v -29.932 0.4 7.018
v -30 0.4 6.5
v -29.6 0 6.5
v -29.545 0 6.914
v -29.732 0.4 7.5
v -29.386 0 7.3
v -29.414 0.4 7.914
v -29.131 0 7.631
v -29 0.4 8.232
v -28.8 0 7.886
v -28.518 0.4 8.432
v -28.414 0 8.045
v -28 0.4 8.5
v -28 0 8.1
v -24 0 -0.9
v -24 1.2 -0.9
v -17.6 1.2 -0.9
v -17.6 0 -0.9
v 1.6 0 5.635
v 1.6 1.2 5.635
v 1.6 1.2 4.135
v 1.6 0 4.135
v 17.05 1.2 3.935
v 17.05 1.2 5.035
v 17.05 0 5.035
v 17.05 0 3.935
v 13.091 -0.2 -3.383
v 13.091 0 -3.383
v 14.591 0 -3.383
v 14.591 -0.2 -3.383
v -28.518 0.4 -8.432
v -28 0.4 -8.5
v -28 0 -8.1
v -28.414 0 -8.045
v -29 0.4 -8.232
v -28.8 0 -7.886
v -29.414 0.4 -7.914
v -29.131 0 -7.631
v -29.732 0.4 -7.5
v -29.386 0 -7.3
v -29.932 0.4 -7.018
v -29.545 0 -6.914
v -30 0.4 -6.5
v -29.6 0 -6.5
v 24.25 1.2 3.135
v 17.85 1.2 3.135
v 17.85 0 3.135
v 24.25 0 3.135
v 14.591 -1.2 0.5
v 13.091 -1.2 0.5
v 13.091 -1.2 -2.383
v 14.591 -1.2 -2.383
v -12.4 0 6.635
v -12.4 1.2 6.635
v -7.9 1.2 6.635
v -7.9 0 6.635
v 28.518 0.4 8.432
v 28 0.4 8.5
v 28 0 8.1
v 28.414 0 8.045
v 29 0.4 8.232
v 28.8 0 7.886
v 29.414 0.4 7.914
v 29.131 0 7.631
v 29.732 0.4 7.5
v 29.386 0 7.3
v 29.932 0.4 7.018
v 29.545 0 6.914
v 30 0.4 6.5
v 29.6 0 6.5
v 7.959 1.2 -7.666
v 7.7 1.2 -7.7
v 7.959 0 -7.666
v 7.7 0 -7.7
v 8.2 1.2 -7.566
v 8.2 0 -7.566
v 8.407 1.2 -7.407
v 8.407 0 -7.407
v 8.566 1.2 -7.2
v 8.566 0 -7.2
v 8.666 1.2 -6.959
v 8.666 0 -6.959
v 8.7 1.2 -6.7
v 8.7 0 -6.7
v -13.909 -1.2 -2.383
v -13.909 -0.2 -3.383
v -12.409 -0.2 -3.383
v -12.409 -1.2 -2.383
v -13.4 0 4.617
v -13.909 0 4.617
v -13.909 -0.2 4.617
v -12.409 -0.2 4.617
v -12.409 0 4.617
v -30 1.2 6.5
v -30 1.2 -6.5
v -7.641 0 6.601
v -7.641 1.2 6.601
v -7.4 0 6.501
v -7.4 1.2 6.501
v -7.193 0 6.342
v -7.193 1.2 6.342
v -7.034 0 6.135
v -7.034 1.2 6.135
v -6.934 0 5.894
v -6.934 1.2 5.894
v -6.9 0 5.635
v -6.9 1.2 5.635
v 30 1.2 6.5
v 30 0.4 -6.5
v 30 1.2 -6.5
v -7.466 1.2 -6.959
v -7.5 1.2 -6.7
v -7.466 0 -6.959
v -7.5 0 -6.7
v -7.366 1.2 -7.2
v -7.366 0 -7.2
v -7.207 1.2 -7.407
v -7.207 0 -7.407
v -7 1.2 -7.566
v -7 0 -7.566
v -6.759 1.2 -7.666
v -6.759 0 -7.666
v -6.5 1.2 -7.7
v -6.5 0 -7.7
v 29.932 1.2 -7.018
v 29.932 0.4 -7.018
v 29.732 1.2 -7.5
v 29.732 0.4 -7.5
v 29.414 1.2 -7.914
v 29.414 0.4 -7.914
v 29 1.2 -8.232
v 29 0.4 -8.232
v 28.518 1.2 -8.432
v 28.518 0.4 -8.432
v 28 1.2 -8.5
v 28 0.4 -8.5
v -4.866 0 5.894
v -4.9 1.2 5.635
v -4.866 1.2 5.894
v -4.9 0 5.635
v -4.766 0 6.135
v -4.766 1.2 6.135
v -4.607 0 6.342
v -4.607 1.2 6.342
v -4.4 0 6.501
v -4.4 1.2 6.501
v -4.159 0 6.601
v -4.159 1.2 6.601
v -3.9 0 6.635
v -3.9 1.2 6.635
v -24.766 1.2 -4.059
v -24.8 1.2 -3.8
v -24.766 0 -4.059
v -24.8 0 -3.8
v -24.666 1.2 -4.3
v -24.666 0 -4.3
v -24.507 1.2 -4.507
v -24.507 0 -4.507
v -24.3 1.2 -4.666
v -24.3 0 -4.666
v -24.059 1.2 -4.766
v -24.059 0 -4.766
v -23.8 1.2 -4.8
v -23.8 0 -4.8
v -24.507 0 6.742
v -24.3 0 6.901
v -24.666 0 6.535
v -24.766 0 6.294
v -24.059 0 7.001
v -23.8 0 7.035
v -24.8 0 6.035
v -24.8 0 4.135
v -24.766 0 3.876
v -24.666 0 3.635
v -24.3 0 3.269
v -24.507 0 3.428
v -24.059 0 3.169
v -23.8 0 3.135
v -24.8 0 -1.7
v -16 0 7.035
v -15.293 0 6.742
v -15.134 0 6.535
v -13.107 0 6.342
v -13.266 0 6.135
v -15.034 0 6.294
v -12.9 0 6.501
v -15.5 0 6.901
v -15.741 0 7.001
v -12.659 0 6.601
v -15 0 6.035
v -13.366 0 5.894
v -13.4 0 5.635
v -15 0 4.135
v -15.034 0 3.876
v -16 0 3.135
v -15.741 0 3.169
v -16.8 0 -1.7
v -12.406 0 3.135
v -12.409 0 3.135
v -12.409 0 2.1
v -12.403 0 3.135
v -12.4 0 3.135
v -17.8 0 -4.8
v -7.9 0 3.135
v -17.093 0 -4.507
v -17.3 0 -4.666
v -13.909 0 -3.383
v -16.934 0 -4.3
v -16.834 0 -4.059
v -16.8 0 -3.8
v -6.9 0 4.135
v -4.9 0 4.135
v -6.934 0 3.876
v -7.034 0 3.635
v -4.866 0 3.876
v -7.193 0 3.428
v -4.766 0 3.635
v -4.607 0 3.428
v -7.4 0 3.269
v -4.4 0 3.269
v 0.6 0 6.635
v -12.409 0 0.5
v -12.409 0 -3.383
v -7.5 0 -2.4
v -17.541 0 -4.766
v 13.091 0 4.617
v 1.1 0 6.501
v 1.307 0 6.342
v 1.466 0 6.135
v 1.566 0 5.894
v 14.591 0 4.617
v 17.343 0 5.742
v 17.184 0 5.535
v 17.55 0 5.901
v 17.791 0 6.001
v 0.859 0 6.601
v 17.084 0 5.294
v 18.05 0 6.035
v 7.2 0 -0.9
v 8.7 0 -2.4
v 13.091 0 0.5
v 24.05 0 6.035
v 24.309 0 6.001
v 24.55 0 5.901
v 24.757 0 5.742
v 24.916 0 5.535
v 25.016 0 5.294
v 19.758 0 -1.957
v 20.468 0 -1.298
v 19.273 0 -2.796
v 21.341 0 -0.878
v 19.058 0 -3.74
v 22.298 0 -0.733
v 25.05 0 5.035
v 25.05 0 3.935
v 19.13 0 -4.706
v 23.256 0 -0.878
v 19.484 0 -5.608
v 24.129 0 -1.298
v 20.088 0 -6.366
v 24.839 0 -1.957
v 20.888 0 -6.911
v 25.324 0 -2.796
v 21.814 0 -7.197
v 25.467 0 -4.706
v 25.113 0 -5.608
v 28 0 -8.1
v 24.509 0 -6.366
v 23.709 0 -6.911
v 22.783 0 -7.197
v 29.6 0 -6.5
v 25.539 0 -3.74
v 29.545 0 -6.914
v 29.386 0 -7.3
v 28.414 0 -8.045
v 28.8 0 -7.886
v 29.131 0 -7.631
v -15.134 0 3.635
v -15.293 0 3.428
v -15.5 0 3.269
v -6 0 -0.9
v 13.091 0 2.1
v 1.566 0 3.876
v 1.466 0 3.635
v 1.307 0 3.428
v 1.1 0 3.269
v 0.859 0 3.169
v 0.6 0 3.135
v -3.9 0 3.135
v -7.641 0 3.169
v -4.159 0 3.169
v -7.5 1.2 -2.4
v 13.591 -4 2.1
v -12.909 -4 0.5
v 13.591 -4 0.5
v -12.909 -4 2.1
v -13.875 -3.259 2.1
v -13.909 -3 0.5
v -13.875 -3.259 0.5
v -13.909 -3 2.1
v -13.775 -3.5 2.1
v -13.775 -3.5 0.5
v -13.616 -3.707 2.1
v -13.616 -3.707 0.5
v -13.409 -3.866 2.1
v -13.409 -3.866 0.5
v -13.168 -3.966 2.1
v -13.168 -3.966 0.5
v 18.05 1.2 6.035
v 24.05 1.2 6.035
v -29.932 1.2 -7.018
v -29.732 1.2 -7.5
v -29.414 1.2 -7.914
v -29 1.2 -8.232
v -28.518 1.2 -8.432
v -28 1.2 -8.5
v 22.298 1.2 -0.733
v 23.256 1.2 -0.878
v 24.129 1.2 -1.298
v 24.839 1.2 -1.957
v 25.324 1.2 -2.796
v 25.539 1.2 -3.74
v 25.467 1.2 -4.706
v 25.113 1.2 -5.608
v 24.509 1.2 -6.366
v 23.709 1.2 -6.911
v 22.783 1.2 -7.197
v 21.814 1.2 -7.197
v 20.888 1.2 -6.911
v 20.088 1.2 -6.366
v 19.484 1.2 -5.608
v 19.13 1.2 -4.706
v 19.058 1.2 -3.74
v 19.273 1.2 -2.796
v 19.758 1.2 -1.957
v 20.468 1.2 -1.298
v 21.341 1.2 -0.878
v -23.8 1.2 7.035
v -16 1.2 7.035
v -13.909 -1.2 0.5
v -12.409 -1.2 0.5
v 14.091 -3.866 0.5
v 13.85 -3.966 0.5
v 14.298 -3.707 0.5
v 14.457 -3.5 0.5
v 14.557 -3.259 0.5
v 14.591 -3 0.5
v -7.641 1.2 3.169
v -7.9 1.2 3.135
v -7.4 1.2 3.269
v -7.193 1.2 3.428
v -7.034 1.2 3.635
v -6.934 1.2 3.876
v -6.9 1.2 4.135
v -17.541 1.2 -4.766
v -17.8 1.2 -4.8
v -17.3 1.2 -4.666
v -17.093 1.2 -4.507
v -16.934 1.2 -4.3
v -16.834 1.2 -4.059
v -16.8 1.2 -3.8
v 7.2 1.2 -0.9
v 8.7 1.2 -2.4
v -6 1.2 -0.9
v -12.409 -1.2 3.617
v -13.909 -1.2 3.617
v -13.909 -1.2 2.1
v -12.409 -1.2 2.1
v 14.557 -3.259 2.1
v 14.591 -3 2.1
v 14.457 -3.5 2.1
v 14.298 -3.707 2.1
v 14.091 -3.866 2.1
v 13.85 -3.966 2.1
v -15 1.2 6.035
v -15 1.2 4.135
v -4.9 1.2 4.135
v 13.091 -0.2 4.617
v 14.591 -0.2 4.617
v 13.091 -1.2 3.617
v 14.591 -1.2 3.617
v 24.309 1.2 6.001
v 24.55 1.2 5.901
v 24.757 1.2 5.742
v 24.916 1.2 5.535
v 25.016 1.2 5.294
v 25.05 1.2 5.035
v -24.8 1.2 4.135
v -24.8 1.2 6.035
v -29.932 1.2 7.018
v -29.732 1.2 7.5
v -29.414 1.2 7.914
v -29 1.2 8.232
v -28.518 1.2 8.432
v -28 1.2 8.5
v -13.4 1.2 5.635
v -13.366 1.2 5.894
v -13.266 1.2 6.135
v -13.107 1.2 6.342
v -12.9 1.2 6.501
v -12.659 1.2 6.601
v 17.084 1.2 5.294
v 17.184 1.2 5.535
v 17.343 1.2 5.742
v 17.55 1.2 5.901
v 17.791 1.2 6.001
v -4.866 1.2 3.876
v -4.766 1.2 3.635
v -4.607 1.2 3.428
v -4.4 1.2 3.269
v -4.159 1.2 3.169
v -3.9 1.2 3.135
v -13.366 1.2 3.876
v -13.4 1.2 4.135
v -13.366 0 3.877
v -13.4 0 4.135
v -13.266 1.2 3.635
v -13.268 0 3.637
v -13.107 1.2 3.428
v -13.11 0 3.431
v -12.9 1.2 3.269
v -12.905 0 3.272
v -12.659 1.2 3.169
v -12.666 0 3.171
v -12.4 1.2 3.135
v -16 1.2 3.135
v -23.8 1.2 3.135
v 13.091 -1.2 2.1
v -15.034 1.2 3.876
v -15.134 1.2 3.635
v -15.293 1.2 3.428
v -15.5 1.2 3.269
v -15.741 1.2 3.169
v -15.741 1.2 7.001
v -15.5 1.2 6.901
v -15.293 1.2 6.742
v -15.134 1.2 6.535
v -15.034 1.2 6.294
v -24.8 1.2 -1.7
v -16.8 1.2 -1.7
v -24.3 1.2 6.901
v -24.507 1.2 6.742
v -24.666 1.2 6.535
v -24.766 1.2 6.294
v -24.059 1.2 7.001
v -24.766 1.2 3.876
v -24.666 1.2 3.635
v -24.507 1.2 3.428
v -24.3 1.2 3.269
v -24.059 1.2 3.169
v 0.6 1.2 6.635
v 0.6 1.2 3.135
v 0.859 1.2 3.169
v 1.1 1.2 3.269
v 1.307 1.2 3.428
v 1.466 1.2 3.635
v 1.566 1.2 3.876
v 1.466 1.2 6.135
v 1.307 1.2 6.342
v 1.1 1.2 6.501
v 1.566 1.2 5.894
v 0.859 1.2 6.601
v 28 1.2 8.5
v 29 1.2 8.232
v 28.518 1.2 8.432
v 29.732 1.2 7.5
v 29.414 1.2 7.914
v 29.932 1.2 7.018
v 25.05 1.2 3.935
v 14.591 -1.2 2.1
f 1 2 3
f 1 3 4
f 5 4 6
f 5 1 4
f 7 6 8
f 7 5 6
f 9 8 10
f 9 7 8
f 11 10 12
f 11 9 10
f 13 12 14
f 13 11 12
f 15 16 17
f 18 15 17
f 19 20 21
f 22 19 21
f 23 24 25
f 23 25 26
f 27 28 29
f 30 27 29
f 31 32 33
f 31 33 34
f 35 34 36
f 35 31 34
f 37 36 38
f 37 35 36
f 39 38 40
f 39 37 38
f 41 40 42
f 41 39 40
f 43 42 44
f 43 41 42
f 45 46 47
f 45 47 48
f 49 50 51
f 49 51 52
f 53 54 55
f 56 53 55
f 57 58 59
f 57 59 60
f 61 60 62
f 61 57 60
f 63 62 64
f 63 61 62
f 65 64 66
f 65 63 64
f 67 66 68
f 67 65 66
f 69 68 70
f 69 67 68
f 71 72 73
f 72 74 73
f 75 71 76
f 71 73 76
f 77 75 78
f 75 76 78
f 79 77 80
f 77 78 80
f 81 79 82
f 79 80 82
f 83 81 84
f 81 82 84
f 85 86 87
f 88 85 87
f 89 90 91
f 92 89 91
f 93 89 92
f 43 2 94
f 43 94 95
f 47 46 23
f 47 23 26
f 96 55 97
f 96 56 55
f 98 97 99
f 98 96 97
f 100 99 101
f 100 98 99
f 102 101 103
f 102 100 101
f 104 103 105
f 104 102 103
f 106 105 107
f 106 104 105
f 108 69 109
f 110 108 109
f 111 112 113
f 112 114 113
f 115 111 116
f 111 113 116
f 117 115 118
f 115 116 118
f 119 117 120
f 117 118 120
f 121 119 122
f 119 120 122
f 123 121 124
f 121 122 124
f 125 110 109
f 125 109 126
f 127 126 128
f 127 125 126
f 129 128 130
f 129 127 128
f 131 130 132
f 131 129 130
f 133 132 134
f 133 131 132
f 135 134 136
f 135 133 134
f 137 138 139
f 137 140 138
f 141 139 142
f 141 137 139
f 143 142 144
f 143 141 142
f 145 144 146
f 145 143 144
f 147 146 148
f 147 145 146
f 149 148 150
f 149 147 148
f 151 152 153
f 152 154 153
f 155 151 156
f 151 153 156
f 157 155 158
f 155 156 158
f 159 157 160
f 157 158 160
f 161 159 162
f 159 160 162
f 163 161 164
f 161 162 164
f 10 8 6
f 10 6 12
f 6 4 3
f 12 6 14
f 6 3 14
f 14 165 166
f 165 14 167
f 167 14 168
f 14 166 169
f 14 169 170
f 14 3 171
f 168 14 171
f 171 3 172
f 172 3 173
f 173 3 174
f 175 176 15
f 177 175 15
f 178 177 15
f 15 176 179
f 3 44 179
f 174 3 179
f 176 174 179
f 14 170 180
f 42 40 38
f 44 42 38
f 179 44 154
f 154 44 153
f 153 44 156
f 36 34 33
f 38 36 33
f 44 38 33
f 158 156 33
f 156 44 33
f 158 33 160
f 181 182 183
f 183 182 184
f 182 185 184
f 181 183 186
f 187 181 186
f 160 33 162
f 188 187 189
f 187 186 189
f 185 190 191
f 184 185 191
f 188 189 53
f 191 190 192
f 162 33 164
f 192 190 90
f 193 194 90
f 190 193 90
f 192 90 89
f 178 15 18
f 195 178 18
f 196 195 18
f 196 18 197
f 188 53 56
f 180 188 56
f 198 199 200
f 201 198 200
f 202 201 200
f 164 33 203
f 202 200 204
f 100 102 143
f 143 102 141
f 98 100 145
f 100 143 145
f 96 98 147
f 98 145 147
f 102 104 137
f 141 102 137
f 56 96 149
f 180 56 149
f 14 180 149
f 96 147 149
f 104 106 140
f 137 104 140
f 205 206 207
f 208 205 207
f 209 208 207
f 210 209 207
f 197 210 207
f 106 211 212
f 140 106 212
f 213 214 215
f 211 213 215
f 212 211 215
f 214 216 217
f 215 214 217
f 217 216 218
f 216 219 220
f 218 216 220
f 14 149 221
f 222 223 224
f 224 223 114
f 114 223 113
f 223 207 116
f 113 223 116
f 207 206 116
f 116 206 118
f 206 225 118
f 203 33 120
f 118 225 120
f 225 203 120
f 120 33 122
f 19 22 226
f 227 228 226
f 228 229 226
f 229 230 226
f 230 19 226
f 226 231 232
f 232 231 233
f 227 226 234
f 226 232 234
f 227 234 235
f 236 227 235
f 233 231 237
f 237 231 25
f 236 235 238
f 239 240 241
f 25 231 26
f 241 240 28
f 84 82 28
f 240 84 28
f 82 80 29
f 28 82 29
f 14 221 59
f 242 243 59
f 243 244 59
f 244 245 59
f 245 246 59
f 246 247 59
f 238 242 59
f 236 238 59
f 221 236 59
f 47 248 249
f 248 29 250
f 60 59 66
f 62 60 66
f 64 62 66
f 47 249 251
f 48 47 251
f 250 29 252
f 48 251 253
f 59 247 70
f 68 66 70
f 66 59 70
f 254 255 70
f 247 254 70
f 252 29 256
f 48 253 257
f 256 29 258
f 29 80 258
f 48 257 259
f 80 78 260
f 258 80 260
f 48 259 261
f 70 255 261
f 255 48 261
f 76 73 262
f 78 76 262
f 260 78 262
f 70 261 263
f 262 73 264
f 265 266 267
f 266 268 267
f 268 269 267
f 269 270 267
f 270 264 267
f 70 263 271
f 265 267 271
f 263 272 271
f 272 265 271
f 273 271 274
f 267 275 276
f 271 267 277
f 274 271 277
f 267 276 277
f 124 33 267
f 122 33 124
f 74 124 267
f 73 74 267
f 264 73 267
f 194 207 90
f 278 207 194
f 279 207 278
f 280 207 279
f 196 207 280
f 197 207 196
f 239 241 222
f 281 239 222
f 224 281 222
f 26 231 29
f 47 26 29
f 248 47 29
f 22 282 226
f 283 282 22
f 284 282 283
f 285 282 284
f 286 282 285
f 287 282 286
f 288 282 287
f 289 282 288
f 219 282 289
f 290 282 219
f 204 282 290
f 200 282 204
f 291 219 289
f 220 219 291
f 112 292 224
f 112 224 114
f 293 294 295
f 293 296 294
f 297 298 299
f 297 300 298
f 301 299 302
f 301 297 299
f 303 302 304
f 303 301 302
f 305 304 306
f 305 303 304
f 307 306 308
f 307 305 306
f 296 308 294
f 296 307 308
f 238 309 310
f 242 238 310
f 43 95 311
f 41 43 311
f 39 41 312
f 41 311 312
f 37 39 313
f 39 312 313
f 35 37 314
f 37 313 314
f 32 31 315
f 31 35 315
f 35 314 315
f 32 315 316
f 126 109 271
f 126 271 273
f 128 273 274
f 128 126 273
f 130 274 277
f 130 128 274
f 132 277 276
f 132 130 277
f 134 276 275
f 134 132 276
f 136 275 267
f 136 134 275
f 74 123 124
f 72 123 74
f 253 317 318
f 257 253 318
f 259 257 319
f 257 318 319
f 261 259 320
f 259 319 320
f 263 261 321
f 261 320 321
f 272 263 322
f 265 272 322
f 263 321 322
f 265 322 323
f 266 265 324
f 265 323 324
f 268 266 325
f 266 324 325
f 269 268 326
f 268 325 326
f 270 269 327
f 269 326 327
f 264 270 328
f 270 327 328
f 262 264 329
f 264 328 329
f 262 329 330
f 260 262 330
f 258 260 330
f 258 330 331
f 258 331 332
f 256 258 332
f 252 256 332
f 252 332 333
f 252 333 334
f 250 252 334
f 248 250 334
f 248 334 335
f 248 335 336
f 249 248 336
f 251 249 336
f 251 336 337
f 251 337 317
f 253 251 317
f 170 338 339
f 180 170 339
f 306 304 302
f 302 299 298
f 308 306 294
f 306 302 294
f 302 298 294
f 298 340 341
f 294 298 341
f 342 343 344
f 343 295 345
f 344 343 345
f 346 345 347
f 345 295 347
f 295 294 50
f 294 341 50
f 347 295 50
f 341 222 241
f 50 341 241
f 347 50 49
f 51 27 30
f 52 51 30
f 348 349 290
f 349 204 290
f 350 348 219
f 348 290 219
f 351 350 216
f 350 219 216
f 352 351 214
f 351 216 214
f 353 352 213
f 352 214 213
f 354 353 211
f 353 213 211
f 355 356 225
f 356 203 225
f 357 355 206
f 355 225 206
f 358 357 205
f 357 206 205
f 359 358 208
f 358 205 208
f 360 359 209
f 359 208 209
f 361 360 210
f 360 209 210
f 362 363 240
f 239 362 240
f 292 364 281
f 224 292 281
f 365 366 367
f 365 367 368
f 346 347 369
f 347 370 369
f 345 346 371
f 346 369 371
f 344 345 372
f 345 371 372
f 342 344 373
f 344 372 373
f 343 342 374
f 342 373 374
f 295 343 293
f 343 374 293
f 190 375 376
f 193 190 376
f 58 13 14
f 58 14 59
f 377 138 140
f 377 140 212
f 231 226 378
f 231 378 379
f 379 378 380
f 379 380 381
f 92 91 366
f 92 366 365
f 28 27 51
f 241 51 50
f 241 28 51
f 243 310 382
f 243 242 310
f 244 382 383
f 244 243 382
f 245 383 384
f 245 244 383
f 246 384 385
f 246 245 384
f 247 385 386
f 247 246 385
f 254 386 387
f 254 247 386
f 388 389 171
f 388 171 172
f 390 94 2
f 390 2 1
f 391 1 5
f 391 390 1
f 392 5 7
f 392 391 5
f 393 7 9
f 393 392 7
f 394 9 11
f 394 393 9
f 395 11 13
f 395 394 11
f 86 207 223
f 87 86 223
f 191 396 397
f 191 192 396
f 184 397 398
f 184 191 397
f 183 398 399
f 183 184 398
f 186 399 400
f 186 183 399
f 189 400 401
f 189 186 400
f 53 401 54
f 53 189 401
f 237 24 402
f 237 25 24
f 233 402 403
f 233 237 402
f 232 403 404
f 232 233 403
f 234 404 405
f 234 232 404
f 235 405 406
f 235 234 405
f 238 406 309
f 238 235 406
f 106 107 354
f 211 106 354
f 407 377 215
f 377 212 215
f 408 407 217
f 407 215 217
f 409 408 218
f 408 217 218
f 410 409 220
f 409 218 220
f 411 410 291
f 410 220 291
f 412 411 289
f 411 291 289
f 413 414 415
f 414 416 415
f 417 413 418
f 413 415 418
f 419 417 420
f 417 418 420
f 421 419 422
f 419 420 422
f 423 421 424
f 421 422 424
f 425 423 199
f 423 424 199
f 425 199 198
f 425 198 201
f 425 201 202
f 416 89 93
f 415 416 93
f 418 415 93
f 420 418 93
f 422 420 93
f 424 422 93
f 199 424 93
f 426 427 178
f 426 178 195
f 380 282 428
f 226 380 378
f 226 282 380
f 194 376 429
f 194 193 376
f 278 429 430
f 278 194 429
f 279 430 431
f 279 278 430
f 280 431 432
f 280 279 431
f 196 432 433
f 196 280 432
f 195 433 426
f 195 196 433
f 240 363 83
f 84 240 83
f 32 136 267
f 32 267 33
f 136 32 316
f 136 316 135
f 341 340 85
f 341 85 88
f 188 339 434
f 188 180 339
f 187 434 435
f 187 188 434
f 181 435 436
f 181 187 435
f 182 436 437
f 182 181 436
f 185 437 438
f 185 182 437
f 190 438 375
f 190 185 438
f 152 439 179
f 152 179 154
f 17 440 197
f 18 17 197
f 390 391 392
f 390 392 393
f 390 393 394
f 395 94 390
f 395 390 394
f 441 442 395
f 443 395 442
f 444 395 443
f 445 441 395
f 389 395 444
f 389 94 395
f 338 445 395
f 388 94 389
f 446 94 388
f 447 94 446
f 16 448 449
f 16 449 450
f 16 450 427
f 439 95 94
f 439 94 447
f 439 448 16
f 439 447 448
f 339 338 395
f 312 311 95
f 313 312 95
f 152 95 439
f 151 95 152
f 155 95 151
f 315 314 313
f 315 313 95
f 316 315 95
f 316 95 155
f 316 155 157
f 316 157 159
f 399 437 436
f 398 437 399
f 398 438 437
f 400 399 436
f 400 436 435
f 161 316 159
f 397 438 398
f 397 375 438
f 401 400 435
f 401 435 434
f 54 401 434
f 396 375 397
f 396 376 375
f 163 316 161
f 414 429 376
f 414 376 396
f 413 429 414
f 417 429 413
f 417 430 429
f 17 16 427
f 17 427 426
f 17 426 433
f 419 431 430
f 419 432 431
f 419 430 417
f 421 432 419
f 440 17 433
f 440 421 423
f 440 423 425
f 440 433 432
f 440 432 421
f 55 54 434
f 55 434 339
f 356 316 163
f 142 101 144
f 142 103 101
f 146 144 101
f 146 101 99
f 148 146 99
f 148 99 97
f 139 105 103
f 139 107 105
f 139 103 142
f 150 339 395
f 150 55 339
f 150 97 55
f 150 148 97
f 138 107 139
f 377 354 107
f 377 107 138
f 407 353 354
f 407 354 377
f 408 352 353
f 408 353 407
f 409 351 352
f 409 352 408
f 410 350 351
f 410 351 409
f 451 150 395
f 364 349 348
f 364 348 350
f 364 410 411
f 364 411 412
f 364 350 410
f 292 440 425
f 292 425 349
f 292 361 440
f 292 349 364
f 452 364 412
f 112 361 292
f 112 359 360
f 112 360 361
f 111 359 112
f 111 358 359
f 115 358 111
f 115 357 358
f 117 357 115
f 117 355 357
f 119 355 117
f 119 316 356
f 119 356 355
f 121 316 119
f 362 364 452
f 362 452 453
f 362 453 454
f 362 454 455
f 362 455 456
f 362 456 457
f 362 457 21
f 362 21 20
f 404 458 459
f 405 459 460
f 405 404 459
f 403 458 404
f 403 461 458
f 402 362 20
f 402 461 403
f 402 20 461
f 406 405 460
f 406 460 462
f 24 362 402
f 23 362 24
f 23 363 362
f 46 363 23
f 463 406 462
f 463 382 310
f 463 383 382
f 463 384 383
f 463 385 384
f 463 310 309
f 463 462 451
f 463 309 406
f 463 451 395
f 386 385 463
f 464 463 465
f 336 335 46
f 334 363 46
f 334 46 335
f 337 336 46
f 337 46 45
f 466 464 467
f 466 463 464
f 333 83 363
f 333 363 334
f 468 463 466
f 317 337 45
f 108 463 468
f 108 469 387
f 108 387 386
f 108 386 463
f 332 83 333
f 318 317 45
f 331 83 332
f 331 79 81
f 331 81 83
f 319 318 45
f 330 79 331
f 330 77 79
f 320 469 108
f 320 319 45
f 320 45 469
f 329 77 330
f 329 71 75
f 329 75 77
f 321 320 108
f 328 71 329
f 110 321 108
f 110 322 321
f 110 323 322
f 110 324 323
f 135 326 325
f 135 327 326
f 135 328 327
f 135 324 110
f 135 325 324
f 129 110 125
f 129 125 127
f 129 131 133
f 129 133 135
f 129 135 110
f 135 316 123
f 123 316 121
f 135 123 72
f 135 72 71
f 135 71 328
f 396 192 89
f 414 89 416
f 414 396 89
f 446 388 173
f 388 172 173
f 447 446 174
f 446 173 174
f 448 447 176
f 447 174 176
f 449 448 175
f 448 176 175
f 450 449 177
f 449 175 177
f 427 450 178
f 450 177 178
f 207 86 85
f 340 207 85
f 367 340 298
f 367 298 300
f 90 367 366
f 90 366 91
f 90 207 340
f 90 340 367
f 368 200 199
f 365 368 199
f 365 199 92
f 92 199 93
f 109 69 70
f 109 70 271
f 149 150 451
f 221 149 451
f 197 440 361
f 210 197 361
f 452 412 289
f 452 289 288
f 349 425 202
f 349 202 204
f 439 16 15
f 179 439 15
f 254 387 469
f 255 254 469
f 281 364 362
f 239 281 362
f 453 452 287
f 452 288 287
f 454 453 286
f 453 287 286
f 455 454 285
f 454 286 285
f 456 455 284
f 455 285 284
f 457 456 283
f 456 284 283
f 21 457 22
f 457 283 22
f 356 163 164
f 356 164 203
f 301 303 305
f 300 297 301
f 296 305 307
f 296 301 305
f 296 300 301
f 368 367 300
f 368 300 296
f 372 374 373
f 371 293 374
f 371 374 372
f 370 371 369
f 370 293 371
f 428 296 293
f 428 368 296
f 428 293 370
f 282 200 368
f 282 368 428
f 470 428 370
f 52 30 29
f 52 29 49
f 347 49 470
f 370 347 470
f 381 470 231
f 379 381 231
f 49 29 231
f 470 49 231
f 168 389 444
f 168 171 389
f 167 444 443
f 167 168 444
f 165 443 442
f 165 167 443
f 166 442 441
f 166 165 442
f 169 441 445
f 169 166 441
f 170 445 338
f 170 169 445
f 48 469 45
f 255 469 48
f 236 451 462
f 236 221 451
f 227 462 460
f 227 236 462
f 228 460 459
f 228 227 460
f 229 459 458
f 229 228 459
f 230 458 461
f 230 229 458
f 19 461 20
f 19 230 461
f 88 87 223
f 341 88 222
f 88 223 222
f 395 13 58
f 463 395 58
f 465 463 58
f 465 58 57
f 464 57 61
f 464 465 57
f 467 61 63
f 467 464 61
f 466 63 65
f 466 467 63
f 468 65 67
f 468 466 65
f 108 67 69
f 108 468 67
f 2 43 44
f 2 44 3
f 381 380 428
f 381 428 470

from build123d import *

# Parameters (mm, degrees)
SKETCH_1_W          = 60
SKETCH_1_H          = 17
EXTRUDE_1_DEPTH     = 1.2
CUT_EXTRUDE_1_REACH = 33.204
SKETCH_4_R          = 3.25
SKETCH_4_W          = 8
SKETCH_4_H          = 3.9
SKETCH_4_W_2        = 16.2
SKETCH_4_H_2        = 6.8
SKETCH_4_H_3        = 2.9
SKETCH_4_W_3        = 6.5
SKETCH_4_H_4        = 3.5
SKETCH_4_W_4        = 9.8
FILLET_2_R          = 1
CHAMFER_1_SIZE      = 0.8
SKETCH_5_W          = 1.5
SKETCH_5_H          = 8
EXTRUDE_2_DEPTH     = 1.2
SKETCH_6_W          = 28.5
SKETCH_6_H          = 1.6
EXTRUDE_3_DEPTH     = 4
FILLET_3_R          = 1
CHAMFER_2_SIZE      = 1
FILLET_4_R          = 2
CHAMFER_5_SIZE      = 0.4
CHAMFER_6_SIZE      = 1.5


with BuildPart() as part:
    # 草图1 → 凸台-拉伸1 (new body)
    with BuildSketch(Plane(origin=(0, 0, 0), x_dir=(1, 0, 0), z_dir=(0, 1, 0))):
        Rectangle(SKETCH_1_W, SKETCH_1_H)
    extrude(amount=EXTRUDE_1_DEPTH)

    # 草图4 → 切除-拉伸1 (cut, up to next)
    with BuildSketch(Plane(origin=(0, 1.2, 0), x_dir=(1, 0, 0), z_dir=(0, 1, 0)), mode=Mode.PRIVATE) as cut_extrude_1_sk1:
        with Locations(Location((22.298485985, 3.98318929, 0), (0, 0, 270))):
            Circle(SKETCH_4_R)
    cut_extrude_1_tool1 = extrude(cut_extrude_1_sk1.sketch, amount=-CUT_EXTRUDE_1_REACH, mode=Mode.PRIVATE) & part.part
    # 草图4 → 切除-拉伸1 (cut, up to next)
    with BuildSketch(Plane(origin=(0, 1.2, 0), x_dir=(1, 0, 0), z_dir=(0, 1, 0)), mode=Mode.PRIVATE) as cut_extrude_1_sk2:
        with Locations((-20.8, 2.85)):
            Rectangle(SKETCH_4_W, SKETCH_4_H)
    cut_extrude_1_tool2 = extrude(cut_extrude_1_sk2.sketch, amount=-CUT_EXTRUDE_1_REACH, mode=Mode.PRIVATE) & part.part
    # 草图4 → 切除-拉伸1 (cut, up to next)
    with BuildSketch(Plane(origin=(0, 1.2, 0), x_dir=(1, 0, 0), z_dir=(0, 1, 0)), mode=Mode.PRIVATE) as cut_extrude_1_sk3:
        with Locations((0.6, 4.3)):
            Rectangle(SKETCH_4_W_2, SKETCH_4_H_2)
    cut_extrude_1_tool3 = extrude(cut_extrude_1_sk3.sketch, amount=-CUT_EXTRUDE_1_REACH, mode=Mode.PRIVATE) & part.part
    # 草图4 → 切除-拉伸1 (cut, up to next)
    with BuildSketch(Plane(origin=(0, 1.2, 0), x_dir=(1, 0, 0), z_dir=(0, 1, 0)), mode=Mode.PRIVATE) as cut_extrude_1_sk4:
        with Locations((21.05, -4.584803861)):
            Rectangle(SKETCH_4_W, SKETCH_4_H_3)
    cut_extrude_1_tool4 = extrude(cut_extrude_1_sk4.sketch, amount=-CUT_EXTRUDE_1_REACH, mode=Mode.PRIVATE) & part.part
    # 草图4 → 切除-拉伸1 (cut, up to next)
    with BuildSketch(Plane(origin=(0, 1.2, 0), x_dir=(1, 0, 0), z_dir=(0, 1, 0)), mode=Mode.PRIVATE) as cut_extrude_1_sk5:
        with Locations((-1.65, -4.884803861)):
            Rectangle(SKETCH_4_W_3, SKETCH_4_H_4)
    cut_extrude_1_tool5 = extrude(cut_extrude_1_sk5.sketch, amount=-CUT_EXTRUDE_1_REACH, mode=Mode.PRIVATE) & part.part
    # 草图4 → 切除-拉伸1 (cut, up to next)
    with BuildSketch(Plane(origin=(0, 1.2, 0), x_dir=(1, 0, 0), z_dir=(0, 1, 0)), mode=Mode.PRIVATE) as cut_extrude_1_sk6:
        with Locations((-10.15, -4.884803861)):
            Rectangle(SKETCH_4_W_3, SKETCH_4_H_4)
    cut_extrude_1_tool6 = extrude(cut_extrude_1_sk6.sketch, amount=-CUT_EXTRUDE_1_REACH, mode=Mode.PRIVATE) & part.part
    # 草图4 → 切除-拉伸1 (cut, up to next)
    with BuildSketch(Plane(origin=(0, 1.2, 0), x_dir=(1, 0, 0), z_dir=(0, 1, 0)), mode=Mode.PRIVATE) as cut_extrude_1_sk7:
        with Locations((-19.9, -5.084803861)):
            Rectangle(SKETCH_4_W_4, SKETCH_4_H)
    cut_extrude_1_tool7 = extrude(cut_extrude_1_sk7.sketch, amount=-CUT_EXTRUDE_1_REACH, mode=Mode.PRIVATE) & part.part
    add(cut_extrude_1_tool1.solids().sort_by_distance((22.298486, 1.2, -3.983189))[0], mode=Mode.SUBTRACT)
    add(cut_extrude_1_tool2.solids().sort_by_distance((-20.8, 1.2, -2.85))[0], mode=Mode.SUBTRACT)
    add(cut_extrude_1_tool3.solids().sort_by_distance((0.6, 1.2, -4.3))[0], mode=Mode.SUBTRACT)
    add(cut_extrude_1_tool4.solids().sort_by_distance((21.05, 1.2, 4.584804))[0], mode=Mode.SUBTRACT)
    add(cut_extrude_1_tool5.solids().sort_by_distance((-1.65, 1.2, 4.884804))[0], mode=Mode.SUBTRACT)
    add(cut_extrude_1_tool6.solids().sort_by_distance((-10.15, 1.2, 4.884804))[0], mode=Mode.SUBTRACT)
    add(cut_extrude_1_tool7.solids().sort_by_distance((-19.9, 1.2, 5.084804))[0], mode=Mode.SUBTRACT)

    # 圆角2
    fillet_2_edges = [part.edges().sort_by_distance(p)[0] for p in [
        (-13.4, 0.6, 6.634803861),
        (-13.4, 0.6, 3.134803861),
        (-6.9, 0.6, 3.134803861),
        (-6.9, 0.6, 6.634803861),
        (-4.9, 0.6, 6.634803861),
        (-4.9, 0.6, 3.134803861),
        (1.6, 0.6, 3.134803861),
        (1.6, 0.6, 6.634803861),
        (17.05, 0.6, 6.034803861),
        (25.05, 0.6, 6.034803861),
        (-7.5, 0.6, -7.7),
        (8.7, 0.6, -7.7),
        (-24.8, 0.6, 7.034803861),
        (-24.8, 0.6, 3.134803861),
        (-15, 0.6, 3.134803861),
        (-15, 0.6, 7.034803861),
        (-24.8, 0.6, -4.8),
        (-16.8, 0.6, -4.8),
    ]]
    fillet(fillet_2_edges, radius=FILLET_2_R)

    # 倒角1
    chamfer_1_edges = [part.edges().sort_by_distance(p)[0] for p in [
        (17.05, 0.6, 3.134803861),
        (25.05, 0.6, 3.134803861),
        (-24.8, 0.6, -0.9),
        (-16.8, 0.6, -0.9),
    ]]
    chamfer(chamfer_1_edges, length=CHAMFER_1_SIZE)

    # 草图5 → 凸台-拉伸2 (add)
    with BuildSketch(Plane.XZ):
        with Locations((-13.15891381, 0.61681071)):
            Rectangle(SKETCH_5_W, SKETCH_5_H)
        with Locations((13.84108619, 0.61681071)):
            Rectangle(SKETCH_5_W, SKETCH_5_H)
    extrude(amount=EXTRUDE_2_DEPTH)

    # 草图6 → 凸台-拉伸3 (add)
    with BuildSketch(Plane.XZ):
        with Locations((0.34108619, 1.3)):
            Rectangle(SKETCH_6_W, SKETCH_6_H)
    extrude(amount=EXTRUDE_3_DEPTH)

    # 圆角3
    fillet_3_edges = [part.edges().sort_by_distance(p)[0] for p in [
        (-13.90891381, -4, 1.3),
        (14.59108619, -4, 1.3),
    ]]
    fillet(fillet_3_edges, radius=FILLET_3_R)

    # 倒角2
    chamfer_2_edges = [part.edges().sort_by_distance(p)[0] for p in [
        (-13.15891381, -1.2, -3.38318929),
        (-13.15891381, -1.2, 4.61681071),
        (13.84108619, -1.2, -3.38318929),
        (13.84108619, -1.2, 4.61681071),
    ]]
    chamfer(chamfer_2_edges, length=CHAMFER_2_SIZE)

    # 圆角4
    fillet_4_edges = [part.edges().sort_by_distance(p)[0] for p in [
        (30, 0.6, 8.5),
        (-30, 0.6, 8.5),
        (-30, 0.6, -8.5),
        (30, 0.6, -8.5),
    ]]
    fillet(fillet_4_edges, radius=FILLET_4_R)

    # 倒角5
    chamfer_5_edges = [part.edges().sort_by_distance(p)[0] for p in [
        (30, 0, 0),
        (0, 0, 8.5),
        (-30, 0, 0),
        (0, 0, -8.5),
        (-29.414213562, 0, -7.914213562),
        (-29.414213562, 0, 7.914213562),
        (29.414213562, 0, -7.914213562),
        (29.414213562, 0, 7.914213562),
    ]]
    chamfer(chamfer_5_edges, length=CHAMFER_5_SIZE)

    # 倒角6
    chamfer_6_edges = [part.edges().sort_by_distance(p)[0] for p in [
        (-7.5, 0.6, -0.9),
        (8.7, 0.6, -0.9),
    ]]
    chamfer(chamfer_6_edges, length=CHAMFER_6_SIZE)


solid = part.part
